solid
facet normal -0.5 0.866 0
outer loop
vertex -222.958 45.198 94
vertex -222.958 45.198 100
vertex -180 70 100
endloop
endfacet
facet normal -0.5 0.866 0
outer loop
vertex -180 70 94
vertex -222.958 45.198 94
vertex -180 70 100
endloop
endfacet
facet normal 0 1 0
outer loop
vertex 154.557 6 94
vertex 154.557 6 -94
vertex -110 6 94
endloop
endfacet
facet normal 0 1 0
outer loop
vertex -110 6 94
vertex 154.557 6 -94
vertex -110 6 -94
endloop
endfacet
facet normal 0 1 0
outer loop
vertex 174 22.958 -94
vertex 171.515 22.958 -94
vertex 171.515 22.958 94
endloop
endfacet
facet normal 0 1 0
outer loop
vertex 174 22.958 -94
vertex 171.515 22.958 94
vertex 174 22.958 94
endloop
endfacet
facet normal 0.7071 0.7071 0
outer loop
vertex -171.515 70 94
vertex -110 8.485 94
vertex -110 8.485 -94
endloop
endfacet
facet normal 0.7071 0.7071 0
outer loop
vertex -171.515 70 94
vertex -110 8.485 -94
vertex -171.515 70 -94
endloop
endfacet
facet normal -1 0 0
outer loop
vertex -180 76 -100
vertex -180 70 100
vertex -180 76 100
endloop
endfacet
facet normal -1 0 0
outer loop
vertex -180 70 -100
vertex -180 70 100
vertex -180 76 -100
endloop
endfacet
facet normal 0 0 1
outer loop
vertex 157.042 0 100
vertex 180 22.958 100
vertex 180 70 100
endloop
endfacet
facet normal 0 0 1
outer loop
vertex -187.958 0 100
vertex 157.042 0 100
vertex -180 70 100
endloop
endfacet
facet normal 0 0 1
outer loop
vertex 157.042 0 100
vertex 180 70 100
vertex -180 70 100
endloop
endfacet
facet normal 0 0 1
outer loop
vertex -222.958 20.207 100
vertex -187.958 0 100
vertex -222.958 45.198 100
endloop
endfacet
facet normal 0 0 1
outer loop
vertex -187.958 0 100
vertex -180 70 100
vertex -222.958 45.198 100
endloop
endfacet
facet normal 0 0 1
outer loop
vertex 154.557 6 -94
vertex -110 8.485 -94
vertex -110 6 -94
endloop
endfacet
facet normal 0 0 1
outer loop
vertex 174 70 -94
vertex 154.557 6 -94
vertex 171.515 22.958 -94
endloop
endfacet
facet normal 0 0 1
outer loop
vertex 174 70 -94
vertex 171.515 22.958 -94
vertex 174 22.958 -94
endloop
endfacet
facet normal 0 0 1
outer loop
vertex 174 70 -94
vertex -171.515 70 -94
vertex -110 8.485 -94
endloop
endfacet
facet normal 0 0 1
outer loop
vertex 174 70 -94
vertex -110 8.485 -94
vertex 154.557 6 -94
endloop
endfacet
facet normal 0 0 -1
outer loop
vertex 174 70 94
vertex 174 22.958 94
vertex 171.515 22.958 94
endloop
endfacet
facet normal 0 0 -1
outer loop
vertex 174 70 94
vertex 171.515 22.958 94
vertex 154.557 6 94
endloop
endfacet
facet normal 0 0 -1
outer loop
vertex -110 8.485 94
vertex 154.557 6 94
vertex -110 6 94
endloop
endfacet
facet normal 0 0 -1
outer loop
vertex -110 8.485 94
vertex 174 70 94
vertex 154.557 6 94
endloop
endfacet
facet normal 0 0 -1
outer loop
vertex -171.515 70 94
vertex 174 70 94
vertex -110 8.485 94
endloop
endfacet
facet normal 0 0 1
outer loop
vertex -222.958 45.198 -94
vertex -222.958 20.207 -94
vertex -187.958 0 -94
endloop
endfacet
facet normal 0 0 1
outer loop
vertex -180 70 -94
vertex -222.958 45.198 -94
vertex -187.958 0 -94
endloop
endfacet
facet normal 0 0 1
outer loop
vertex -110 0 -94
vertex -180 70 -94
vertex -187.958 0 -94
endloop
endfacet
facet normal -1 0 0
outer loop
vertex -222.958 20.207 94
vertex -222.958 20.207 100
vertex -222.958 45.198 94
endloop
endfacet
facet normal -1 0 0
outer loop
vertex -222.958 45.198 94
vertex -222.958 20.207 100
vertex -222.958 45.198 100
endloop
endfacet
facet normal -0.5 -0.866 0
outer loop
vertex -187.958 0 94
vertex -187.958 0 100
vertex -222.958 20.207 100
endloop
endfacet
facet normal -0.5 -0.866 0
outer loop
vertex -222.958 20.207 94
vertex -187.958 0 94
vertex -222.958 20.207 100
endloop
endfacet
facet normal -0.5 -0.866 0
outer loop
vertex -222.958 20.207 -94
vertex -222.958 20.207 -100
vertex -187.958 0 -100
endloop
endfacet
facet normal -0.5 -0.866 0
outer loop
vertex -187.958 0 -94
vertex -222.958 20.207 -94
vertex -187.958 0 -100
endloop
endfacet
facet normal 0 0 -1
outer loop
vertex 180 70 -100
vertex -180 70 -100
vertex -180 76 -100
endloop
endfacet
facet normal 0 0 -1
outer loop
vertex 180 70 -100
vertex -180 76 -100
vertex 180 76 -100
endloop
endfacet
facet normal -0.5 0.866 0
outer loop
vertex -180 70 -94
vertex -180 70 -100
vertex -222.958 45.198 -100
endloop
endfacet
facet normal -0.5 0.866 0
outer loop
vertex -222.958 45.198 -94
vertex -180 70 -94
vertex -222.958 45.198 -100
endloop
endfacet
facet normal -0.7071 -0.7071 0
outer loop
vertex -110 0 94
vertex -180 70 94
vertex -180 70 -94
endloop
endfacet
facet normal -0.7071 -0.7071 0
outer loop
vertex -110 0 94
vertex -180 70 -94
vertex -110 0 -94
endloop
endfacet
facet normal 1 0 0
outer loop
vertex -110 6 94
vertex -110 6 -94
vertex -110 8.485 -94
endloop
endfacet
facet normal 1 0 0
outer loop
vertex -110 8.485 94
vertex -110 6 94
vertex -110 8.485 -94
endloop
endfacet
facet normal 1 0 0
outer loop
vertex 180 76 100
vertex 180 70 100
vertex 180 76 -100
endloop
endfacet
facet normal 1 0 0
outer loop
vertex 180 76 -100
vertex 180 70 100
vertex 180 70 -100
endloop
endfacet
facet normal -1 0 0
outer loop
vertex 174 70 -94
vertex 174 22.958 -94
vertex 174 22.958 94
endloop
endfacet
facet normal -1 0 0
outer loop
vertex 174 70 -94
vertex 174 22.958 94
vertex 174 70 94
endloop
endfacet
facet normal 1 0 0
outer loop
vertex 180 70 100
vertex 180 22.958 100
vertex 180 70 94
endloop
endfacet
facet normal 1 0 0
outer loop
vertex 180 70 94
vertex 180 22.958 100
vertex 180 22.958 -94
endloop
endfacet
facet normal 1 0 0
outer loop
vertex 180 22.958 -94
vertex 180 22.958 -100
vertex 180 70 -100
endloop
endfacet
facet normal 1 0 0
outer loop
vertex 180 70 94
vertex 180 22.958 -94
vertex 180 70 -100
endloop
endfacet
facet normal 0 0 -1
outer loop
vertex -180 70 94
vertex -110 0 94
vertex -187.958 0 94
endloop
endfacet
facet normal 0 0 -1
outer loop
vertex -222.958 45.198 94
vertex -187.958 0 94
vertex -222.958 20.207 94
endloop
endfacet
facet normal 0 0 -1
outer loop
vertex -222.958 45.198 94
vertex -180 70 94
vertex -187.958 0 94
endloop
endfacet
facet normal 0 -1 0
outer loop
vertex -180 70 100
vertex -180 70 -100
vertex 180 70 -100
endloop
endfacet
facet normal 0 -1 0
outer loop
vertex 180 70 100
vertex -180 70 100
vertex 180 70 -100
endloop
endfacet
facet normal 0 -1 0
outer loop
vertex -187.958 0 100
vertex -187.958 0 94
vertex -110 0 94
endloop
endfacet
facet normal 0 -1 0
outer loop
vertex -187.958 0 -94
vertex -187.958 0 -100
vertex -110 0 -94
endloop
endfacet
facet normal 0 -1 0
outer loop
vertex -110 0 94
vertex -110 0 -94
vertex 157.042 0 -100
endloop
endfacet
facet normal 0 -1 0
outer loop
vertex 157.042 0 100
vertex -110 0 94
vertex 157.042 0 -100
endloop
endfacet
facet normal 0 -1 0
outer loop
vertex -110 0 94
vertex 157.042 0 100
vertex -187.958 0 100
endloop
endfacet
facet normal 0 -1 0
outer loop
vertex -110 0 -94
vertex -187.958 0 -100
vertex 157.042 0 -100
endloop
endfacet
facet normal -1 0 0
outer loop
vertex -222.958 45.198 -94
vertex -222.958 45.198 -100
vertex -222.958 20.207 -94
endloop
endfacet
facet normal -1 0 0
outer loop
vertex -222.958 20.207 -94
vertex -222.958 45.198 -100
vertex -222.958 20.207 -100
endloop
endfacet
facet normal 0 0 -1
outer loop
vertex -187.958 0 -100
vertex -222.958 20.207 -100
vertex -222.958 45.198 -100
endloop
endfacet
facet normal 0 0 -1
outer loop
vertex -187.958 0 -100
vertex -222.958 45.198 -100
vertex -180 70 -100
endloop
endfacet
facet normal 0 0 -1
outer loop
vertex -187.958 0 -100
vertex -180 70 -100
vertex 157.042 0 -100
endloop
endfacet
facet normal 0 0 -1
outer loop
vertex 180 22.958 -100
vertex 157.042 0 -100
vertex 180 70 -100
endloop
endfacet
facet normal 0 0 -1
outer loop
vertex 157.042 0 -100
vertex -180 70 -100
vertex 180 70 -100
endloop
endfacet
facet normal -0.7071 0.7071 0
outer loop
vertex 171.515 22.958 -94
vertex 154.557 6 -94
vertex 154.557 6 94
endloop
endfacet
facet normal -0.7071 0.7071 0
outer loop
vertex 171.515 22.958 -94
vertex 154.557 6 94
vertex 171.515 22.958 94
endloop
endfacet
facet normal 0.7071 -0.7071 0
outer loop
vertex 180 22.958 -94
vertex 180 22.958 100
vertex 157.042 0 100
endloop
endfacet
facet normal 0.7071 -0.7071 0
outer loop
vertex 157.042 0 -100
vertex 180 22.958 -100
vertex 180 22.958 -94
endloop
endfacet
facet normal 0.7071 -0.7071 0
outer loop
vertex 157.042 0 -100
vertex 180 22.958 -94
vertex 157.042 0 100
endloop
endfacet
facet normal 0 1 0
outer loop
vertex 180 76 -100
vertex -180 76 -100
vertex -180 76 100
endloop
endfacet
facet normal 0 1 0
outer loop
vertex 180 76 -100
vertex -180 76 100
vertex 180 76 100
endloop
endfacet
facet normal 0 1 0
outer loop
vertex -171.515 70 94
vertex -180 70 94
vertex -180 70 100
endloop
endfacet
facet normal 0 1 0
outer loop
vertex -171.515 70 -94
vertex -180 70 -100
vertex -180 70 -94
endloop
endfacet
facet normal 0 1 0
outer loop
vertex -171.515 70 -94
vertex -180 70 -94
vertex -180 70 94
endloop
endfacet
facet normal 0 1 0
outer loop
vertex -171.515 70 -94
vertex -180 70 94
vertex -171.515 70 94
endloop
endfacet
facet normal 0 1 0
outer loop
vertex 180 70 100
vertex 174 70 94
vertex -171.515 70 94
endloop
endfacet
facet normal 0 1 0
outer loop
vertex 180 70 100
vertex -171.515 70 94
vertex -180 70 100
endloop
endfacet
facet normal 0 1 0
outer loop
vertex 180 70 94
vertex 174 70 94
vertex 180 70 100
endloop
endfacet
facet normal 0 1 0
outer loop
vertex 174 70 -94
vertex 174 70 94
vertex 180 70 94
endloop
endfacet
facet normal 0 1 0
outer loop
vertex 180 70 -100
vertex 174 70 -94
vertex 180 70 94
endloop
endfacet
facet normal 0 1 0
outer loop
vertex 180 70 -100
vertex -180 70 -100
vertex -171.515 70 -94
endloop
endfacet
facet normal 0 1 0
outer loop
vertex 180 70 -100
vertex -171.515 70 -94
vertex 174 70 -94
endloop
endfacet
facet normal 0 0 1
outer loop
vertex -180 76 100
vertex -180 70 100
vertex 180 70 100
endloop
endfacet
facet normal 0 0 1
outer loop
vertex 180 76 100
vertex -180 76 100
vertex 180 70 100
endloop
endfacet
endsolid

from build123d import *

# Parameters (mm, degrees)
BOSS_EXTRUDE2_DEPTH = 6
BOSS_EXTRUDE3_DEPTH = 6
BOSS_EXTRUDE4_DEPTH = 188
SKETCH13_W          = 6
SKETCH13_H          = 47.042386743
BOSS_EXTRUDE5_DEPTH = 188
BOSS_EXTRUDE6_DEPTH = 188
BOSS_EXTRUDE7_DEPTH = 188
SKETCH16_W          = 360
SKETCH16_H          = 200
BOSS_EXTRUDE8_DEPTH = 6


with BuildPart() as part:
    # Right Panel → Boss-Extrude2 (new body)
    with BuildSketch(Plane(origin=(0, 0, -100), x_dir=(-1, 0, 0), z_dir=(0, 0, -1))):
        Polygon((-180, 70), (180, 70), (222.957613257, 45.198410422), (222.957613257, 20.207259422), (187.957613257, 0), (-157.042386743, 0), (-180, 22.957613257), align=None)
    extrude(amount=-BOSS_EXTRUDE2_DEPTH)



with BuildPart() as body_2:
    # Left Panel(Main) → Boss-Extrude3 (new body)
    with BuildSketch(Plane.XY.offset(100)):
        Polygon((157.042386743, 0), (-187.957613257, 0), (-222.957613257, 20.207259422), (-222.957613257, 45.198410422), (-180, 70), (180, 70), (180, 22.957613257), align=None)
    extrude(amount=-BOSS_EXTRUDE3_DEPTH)


with BuildPart() as body_3:
    # Sketch12 → Boss-Extrude4 (new body)
    with BuildSketch(Plane.XY.offset(-94)):
        Polygon((-110, 8.485281374), (-171.514718626, 70), (-180, 70), (-110, 0), align=None)
    extrude(amount=BOSS_EXTRUDE4_DEPTH)


with BuildPart() as body_4:
    # Sketch13 → Boss-Extrude5 (new body)
    with BuildSketch(Plane.XY.offset(-94)):
        with Locations((177, 46.478806629)):
            Rectangle(SKETCH13_W, SKETCH13_H)
    extrude(amount=BOSS_EXTRUDE5_DEPTH)


with BuildPart() as part_1:
    add(part.part)

    add(body_2.part)  # Boss-Extrude6 merges body 2

    add(body_3.part)  # Boss-Extrude6 merges body 3
    # Sketch15 → Boss-Extrude6 (add)
    with BuildSketch(Plane.XY.offset(-94)):
        Polygon((-110, 0), (157.042386743, 0), (163.042386743, 6), (-110, 6), align=None)
    extrude(amount=BOSS_EXTRUDE6_DEPTH)


    add(body_4.part)  # Boss-Extrude7 merges body 4
    # Sketch14 → Boss-Extrude7 (add)
    with BuildSketch(Plane.XY.offset(-94)):
        Polygon((180, 22.957613257), (163.042386743, 6), (154.557105369, 6), (171.514718626, 22.957613257), align=None)
    extrude(amount=BOSS_EXTRUDE7_DEPTH)


with BuildPart() as body_2_2:
    # Sketch16 → Boss-Extrude8 (new body)
    with BuildSketch(Plane(origin=(0, 70, 0), x_dir=(1, 0, 0), z_dir=(0, 1, 0))):
        Rectangle(SKETCH16_W, SKETCH16_H)
    extrude(amount=BOSS_EXTRUDE8_DEPTH)


solid = Compound([part_1.part, body_2_2.part])
